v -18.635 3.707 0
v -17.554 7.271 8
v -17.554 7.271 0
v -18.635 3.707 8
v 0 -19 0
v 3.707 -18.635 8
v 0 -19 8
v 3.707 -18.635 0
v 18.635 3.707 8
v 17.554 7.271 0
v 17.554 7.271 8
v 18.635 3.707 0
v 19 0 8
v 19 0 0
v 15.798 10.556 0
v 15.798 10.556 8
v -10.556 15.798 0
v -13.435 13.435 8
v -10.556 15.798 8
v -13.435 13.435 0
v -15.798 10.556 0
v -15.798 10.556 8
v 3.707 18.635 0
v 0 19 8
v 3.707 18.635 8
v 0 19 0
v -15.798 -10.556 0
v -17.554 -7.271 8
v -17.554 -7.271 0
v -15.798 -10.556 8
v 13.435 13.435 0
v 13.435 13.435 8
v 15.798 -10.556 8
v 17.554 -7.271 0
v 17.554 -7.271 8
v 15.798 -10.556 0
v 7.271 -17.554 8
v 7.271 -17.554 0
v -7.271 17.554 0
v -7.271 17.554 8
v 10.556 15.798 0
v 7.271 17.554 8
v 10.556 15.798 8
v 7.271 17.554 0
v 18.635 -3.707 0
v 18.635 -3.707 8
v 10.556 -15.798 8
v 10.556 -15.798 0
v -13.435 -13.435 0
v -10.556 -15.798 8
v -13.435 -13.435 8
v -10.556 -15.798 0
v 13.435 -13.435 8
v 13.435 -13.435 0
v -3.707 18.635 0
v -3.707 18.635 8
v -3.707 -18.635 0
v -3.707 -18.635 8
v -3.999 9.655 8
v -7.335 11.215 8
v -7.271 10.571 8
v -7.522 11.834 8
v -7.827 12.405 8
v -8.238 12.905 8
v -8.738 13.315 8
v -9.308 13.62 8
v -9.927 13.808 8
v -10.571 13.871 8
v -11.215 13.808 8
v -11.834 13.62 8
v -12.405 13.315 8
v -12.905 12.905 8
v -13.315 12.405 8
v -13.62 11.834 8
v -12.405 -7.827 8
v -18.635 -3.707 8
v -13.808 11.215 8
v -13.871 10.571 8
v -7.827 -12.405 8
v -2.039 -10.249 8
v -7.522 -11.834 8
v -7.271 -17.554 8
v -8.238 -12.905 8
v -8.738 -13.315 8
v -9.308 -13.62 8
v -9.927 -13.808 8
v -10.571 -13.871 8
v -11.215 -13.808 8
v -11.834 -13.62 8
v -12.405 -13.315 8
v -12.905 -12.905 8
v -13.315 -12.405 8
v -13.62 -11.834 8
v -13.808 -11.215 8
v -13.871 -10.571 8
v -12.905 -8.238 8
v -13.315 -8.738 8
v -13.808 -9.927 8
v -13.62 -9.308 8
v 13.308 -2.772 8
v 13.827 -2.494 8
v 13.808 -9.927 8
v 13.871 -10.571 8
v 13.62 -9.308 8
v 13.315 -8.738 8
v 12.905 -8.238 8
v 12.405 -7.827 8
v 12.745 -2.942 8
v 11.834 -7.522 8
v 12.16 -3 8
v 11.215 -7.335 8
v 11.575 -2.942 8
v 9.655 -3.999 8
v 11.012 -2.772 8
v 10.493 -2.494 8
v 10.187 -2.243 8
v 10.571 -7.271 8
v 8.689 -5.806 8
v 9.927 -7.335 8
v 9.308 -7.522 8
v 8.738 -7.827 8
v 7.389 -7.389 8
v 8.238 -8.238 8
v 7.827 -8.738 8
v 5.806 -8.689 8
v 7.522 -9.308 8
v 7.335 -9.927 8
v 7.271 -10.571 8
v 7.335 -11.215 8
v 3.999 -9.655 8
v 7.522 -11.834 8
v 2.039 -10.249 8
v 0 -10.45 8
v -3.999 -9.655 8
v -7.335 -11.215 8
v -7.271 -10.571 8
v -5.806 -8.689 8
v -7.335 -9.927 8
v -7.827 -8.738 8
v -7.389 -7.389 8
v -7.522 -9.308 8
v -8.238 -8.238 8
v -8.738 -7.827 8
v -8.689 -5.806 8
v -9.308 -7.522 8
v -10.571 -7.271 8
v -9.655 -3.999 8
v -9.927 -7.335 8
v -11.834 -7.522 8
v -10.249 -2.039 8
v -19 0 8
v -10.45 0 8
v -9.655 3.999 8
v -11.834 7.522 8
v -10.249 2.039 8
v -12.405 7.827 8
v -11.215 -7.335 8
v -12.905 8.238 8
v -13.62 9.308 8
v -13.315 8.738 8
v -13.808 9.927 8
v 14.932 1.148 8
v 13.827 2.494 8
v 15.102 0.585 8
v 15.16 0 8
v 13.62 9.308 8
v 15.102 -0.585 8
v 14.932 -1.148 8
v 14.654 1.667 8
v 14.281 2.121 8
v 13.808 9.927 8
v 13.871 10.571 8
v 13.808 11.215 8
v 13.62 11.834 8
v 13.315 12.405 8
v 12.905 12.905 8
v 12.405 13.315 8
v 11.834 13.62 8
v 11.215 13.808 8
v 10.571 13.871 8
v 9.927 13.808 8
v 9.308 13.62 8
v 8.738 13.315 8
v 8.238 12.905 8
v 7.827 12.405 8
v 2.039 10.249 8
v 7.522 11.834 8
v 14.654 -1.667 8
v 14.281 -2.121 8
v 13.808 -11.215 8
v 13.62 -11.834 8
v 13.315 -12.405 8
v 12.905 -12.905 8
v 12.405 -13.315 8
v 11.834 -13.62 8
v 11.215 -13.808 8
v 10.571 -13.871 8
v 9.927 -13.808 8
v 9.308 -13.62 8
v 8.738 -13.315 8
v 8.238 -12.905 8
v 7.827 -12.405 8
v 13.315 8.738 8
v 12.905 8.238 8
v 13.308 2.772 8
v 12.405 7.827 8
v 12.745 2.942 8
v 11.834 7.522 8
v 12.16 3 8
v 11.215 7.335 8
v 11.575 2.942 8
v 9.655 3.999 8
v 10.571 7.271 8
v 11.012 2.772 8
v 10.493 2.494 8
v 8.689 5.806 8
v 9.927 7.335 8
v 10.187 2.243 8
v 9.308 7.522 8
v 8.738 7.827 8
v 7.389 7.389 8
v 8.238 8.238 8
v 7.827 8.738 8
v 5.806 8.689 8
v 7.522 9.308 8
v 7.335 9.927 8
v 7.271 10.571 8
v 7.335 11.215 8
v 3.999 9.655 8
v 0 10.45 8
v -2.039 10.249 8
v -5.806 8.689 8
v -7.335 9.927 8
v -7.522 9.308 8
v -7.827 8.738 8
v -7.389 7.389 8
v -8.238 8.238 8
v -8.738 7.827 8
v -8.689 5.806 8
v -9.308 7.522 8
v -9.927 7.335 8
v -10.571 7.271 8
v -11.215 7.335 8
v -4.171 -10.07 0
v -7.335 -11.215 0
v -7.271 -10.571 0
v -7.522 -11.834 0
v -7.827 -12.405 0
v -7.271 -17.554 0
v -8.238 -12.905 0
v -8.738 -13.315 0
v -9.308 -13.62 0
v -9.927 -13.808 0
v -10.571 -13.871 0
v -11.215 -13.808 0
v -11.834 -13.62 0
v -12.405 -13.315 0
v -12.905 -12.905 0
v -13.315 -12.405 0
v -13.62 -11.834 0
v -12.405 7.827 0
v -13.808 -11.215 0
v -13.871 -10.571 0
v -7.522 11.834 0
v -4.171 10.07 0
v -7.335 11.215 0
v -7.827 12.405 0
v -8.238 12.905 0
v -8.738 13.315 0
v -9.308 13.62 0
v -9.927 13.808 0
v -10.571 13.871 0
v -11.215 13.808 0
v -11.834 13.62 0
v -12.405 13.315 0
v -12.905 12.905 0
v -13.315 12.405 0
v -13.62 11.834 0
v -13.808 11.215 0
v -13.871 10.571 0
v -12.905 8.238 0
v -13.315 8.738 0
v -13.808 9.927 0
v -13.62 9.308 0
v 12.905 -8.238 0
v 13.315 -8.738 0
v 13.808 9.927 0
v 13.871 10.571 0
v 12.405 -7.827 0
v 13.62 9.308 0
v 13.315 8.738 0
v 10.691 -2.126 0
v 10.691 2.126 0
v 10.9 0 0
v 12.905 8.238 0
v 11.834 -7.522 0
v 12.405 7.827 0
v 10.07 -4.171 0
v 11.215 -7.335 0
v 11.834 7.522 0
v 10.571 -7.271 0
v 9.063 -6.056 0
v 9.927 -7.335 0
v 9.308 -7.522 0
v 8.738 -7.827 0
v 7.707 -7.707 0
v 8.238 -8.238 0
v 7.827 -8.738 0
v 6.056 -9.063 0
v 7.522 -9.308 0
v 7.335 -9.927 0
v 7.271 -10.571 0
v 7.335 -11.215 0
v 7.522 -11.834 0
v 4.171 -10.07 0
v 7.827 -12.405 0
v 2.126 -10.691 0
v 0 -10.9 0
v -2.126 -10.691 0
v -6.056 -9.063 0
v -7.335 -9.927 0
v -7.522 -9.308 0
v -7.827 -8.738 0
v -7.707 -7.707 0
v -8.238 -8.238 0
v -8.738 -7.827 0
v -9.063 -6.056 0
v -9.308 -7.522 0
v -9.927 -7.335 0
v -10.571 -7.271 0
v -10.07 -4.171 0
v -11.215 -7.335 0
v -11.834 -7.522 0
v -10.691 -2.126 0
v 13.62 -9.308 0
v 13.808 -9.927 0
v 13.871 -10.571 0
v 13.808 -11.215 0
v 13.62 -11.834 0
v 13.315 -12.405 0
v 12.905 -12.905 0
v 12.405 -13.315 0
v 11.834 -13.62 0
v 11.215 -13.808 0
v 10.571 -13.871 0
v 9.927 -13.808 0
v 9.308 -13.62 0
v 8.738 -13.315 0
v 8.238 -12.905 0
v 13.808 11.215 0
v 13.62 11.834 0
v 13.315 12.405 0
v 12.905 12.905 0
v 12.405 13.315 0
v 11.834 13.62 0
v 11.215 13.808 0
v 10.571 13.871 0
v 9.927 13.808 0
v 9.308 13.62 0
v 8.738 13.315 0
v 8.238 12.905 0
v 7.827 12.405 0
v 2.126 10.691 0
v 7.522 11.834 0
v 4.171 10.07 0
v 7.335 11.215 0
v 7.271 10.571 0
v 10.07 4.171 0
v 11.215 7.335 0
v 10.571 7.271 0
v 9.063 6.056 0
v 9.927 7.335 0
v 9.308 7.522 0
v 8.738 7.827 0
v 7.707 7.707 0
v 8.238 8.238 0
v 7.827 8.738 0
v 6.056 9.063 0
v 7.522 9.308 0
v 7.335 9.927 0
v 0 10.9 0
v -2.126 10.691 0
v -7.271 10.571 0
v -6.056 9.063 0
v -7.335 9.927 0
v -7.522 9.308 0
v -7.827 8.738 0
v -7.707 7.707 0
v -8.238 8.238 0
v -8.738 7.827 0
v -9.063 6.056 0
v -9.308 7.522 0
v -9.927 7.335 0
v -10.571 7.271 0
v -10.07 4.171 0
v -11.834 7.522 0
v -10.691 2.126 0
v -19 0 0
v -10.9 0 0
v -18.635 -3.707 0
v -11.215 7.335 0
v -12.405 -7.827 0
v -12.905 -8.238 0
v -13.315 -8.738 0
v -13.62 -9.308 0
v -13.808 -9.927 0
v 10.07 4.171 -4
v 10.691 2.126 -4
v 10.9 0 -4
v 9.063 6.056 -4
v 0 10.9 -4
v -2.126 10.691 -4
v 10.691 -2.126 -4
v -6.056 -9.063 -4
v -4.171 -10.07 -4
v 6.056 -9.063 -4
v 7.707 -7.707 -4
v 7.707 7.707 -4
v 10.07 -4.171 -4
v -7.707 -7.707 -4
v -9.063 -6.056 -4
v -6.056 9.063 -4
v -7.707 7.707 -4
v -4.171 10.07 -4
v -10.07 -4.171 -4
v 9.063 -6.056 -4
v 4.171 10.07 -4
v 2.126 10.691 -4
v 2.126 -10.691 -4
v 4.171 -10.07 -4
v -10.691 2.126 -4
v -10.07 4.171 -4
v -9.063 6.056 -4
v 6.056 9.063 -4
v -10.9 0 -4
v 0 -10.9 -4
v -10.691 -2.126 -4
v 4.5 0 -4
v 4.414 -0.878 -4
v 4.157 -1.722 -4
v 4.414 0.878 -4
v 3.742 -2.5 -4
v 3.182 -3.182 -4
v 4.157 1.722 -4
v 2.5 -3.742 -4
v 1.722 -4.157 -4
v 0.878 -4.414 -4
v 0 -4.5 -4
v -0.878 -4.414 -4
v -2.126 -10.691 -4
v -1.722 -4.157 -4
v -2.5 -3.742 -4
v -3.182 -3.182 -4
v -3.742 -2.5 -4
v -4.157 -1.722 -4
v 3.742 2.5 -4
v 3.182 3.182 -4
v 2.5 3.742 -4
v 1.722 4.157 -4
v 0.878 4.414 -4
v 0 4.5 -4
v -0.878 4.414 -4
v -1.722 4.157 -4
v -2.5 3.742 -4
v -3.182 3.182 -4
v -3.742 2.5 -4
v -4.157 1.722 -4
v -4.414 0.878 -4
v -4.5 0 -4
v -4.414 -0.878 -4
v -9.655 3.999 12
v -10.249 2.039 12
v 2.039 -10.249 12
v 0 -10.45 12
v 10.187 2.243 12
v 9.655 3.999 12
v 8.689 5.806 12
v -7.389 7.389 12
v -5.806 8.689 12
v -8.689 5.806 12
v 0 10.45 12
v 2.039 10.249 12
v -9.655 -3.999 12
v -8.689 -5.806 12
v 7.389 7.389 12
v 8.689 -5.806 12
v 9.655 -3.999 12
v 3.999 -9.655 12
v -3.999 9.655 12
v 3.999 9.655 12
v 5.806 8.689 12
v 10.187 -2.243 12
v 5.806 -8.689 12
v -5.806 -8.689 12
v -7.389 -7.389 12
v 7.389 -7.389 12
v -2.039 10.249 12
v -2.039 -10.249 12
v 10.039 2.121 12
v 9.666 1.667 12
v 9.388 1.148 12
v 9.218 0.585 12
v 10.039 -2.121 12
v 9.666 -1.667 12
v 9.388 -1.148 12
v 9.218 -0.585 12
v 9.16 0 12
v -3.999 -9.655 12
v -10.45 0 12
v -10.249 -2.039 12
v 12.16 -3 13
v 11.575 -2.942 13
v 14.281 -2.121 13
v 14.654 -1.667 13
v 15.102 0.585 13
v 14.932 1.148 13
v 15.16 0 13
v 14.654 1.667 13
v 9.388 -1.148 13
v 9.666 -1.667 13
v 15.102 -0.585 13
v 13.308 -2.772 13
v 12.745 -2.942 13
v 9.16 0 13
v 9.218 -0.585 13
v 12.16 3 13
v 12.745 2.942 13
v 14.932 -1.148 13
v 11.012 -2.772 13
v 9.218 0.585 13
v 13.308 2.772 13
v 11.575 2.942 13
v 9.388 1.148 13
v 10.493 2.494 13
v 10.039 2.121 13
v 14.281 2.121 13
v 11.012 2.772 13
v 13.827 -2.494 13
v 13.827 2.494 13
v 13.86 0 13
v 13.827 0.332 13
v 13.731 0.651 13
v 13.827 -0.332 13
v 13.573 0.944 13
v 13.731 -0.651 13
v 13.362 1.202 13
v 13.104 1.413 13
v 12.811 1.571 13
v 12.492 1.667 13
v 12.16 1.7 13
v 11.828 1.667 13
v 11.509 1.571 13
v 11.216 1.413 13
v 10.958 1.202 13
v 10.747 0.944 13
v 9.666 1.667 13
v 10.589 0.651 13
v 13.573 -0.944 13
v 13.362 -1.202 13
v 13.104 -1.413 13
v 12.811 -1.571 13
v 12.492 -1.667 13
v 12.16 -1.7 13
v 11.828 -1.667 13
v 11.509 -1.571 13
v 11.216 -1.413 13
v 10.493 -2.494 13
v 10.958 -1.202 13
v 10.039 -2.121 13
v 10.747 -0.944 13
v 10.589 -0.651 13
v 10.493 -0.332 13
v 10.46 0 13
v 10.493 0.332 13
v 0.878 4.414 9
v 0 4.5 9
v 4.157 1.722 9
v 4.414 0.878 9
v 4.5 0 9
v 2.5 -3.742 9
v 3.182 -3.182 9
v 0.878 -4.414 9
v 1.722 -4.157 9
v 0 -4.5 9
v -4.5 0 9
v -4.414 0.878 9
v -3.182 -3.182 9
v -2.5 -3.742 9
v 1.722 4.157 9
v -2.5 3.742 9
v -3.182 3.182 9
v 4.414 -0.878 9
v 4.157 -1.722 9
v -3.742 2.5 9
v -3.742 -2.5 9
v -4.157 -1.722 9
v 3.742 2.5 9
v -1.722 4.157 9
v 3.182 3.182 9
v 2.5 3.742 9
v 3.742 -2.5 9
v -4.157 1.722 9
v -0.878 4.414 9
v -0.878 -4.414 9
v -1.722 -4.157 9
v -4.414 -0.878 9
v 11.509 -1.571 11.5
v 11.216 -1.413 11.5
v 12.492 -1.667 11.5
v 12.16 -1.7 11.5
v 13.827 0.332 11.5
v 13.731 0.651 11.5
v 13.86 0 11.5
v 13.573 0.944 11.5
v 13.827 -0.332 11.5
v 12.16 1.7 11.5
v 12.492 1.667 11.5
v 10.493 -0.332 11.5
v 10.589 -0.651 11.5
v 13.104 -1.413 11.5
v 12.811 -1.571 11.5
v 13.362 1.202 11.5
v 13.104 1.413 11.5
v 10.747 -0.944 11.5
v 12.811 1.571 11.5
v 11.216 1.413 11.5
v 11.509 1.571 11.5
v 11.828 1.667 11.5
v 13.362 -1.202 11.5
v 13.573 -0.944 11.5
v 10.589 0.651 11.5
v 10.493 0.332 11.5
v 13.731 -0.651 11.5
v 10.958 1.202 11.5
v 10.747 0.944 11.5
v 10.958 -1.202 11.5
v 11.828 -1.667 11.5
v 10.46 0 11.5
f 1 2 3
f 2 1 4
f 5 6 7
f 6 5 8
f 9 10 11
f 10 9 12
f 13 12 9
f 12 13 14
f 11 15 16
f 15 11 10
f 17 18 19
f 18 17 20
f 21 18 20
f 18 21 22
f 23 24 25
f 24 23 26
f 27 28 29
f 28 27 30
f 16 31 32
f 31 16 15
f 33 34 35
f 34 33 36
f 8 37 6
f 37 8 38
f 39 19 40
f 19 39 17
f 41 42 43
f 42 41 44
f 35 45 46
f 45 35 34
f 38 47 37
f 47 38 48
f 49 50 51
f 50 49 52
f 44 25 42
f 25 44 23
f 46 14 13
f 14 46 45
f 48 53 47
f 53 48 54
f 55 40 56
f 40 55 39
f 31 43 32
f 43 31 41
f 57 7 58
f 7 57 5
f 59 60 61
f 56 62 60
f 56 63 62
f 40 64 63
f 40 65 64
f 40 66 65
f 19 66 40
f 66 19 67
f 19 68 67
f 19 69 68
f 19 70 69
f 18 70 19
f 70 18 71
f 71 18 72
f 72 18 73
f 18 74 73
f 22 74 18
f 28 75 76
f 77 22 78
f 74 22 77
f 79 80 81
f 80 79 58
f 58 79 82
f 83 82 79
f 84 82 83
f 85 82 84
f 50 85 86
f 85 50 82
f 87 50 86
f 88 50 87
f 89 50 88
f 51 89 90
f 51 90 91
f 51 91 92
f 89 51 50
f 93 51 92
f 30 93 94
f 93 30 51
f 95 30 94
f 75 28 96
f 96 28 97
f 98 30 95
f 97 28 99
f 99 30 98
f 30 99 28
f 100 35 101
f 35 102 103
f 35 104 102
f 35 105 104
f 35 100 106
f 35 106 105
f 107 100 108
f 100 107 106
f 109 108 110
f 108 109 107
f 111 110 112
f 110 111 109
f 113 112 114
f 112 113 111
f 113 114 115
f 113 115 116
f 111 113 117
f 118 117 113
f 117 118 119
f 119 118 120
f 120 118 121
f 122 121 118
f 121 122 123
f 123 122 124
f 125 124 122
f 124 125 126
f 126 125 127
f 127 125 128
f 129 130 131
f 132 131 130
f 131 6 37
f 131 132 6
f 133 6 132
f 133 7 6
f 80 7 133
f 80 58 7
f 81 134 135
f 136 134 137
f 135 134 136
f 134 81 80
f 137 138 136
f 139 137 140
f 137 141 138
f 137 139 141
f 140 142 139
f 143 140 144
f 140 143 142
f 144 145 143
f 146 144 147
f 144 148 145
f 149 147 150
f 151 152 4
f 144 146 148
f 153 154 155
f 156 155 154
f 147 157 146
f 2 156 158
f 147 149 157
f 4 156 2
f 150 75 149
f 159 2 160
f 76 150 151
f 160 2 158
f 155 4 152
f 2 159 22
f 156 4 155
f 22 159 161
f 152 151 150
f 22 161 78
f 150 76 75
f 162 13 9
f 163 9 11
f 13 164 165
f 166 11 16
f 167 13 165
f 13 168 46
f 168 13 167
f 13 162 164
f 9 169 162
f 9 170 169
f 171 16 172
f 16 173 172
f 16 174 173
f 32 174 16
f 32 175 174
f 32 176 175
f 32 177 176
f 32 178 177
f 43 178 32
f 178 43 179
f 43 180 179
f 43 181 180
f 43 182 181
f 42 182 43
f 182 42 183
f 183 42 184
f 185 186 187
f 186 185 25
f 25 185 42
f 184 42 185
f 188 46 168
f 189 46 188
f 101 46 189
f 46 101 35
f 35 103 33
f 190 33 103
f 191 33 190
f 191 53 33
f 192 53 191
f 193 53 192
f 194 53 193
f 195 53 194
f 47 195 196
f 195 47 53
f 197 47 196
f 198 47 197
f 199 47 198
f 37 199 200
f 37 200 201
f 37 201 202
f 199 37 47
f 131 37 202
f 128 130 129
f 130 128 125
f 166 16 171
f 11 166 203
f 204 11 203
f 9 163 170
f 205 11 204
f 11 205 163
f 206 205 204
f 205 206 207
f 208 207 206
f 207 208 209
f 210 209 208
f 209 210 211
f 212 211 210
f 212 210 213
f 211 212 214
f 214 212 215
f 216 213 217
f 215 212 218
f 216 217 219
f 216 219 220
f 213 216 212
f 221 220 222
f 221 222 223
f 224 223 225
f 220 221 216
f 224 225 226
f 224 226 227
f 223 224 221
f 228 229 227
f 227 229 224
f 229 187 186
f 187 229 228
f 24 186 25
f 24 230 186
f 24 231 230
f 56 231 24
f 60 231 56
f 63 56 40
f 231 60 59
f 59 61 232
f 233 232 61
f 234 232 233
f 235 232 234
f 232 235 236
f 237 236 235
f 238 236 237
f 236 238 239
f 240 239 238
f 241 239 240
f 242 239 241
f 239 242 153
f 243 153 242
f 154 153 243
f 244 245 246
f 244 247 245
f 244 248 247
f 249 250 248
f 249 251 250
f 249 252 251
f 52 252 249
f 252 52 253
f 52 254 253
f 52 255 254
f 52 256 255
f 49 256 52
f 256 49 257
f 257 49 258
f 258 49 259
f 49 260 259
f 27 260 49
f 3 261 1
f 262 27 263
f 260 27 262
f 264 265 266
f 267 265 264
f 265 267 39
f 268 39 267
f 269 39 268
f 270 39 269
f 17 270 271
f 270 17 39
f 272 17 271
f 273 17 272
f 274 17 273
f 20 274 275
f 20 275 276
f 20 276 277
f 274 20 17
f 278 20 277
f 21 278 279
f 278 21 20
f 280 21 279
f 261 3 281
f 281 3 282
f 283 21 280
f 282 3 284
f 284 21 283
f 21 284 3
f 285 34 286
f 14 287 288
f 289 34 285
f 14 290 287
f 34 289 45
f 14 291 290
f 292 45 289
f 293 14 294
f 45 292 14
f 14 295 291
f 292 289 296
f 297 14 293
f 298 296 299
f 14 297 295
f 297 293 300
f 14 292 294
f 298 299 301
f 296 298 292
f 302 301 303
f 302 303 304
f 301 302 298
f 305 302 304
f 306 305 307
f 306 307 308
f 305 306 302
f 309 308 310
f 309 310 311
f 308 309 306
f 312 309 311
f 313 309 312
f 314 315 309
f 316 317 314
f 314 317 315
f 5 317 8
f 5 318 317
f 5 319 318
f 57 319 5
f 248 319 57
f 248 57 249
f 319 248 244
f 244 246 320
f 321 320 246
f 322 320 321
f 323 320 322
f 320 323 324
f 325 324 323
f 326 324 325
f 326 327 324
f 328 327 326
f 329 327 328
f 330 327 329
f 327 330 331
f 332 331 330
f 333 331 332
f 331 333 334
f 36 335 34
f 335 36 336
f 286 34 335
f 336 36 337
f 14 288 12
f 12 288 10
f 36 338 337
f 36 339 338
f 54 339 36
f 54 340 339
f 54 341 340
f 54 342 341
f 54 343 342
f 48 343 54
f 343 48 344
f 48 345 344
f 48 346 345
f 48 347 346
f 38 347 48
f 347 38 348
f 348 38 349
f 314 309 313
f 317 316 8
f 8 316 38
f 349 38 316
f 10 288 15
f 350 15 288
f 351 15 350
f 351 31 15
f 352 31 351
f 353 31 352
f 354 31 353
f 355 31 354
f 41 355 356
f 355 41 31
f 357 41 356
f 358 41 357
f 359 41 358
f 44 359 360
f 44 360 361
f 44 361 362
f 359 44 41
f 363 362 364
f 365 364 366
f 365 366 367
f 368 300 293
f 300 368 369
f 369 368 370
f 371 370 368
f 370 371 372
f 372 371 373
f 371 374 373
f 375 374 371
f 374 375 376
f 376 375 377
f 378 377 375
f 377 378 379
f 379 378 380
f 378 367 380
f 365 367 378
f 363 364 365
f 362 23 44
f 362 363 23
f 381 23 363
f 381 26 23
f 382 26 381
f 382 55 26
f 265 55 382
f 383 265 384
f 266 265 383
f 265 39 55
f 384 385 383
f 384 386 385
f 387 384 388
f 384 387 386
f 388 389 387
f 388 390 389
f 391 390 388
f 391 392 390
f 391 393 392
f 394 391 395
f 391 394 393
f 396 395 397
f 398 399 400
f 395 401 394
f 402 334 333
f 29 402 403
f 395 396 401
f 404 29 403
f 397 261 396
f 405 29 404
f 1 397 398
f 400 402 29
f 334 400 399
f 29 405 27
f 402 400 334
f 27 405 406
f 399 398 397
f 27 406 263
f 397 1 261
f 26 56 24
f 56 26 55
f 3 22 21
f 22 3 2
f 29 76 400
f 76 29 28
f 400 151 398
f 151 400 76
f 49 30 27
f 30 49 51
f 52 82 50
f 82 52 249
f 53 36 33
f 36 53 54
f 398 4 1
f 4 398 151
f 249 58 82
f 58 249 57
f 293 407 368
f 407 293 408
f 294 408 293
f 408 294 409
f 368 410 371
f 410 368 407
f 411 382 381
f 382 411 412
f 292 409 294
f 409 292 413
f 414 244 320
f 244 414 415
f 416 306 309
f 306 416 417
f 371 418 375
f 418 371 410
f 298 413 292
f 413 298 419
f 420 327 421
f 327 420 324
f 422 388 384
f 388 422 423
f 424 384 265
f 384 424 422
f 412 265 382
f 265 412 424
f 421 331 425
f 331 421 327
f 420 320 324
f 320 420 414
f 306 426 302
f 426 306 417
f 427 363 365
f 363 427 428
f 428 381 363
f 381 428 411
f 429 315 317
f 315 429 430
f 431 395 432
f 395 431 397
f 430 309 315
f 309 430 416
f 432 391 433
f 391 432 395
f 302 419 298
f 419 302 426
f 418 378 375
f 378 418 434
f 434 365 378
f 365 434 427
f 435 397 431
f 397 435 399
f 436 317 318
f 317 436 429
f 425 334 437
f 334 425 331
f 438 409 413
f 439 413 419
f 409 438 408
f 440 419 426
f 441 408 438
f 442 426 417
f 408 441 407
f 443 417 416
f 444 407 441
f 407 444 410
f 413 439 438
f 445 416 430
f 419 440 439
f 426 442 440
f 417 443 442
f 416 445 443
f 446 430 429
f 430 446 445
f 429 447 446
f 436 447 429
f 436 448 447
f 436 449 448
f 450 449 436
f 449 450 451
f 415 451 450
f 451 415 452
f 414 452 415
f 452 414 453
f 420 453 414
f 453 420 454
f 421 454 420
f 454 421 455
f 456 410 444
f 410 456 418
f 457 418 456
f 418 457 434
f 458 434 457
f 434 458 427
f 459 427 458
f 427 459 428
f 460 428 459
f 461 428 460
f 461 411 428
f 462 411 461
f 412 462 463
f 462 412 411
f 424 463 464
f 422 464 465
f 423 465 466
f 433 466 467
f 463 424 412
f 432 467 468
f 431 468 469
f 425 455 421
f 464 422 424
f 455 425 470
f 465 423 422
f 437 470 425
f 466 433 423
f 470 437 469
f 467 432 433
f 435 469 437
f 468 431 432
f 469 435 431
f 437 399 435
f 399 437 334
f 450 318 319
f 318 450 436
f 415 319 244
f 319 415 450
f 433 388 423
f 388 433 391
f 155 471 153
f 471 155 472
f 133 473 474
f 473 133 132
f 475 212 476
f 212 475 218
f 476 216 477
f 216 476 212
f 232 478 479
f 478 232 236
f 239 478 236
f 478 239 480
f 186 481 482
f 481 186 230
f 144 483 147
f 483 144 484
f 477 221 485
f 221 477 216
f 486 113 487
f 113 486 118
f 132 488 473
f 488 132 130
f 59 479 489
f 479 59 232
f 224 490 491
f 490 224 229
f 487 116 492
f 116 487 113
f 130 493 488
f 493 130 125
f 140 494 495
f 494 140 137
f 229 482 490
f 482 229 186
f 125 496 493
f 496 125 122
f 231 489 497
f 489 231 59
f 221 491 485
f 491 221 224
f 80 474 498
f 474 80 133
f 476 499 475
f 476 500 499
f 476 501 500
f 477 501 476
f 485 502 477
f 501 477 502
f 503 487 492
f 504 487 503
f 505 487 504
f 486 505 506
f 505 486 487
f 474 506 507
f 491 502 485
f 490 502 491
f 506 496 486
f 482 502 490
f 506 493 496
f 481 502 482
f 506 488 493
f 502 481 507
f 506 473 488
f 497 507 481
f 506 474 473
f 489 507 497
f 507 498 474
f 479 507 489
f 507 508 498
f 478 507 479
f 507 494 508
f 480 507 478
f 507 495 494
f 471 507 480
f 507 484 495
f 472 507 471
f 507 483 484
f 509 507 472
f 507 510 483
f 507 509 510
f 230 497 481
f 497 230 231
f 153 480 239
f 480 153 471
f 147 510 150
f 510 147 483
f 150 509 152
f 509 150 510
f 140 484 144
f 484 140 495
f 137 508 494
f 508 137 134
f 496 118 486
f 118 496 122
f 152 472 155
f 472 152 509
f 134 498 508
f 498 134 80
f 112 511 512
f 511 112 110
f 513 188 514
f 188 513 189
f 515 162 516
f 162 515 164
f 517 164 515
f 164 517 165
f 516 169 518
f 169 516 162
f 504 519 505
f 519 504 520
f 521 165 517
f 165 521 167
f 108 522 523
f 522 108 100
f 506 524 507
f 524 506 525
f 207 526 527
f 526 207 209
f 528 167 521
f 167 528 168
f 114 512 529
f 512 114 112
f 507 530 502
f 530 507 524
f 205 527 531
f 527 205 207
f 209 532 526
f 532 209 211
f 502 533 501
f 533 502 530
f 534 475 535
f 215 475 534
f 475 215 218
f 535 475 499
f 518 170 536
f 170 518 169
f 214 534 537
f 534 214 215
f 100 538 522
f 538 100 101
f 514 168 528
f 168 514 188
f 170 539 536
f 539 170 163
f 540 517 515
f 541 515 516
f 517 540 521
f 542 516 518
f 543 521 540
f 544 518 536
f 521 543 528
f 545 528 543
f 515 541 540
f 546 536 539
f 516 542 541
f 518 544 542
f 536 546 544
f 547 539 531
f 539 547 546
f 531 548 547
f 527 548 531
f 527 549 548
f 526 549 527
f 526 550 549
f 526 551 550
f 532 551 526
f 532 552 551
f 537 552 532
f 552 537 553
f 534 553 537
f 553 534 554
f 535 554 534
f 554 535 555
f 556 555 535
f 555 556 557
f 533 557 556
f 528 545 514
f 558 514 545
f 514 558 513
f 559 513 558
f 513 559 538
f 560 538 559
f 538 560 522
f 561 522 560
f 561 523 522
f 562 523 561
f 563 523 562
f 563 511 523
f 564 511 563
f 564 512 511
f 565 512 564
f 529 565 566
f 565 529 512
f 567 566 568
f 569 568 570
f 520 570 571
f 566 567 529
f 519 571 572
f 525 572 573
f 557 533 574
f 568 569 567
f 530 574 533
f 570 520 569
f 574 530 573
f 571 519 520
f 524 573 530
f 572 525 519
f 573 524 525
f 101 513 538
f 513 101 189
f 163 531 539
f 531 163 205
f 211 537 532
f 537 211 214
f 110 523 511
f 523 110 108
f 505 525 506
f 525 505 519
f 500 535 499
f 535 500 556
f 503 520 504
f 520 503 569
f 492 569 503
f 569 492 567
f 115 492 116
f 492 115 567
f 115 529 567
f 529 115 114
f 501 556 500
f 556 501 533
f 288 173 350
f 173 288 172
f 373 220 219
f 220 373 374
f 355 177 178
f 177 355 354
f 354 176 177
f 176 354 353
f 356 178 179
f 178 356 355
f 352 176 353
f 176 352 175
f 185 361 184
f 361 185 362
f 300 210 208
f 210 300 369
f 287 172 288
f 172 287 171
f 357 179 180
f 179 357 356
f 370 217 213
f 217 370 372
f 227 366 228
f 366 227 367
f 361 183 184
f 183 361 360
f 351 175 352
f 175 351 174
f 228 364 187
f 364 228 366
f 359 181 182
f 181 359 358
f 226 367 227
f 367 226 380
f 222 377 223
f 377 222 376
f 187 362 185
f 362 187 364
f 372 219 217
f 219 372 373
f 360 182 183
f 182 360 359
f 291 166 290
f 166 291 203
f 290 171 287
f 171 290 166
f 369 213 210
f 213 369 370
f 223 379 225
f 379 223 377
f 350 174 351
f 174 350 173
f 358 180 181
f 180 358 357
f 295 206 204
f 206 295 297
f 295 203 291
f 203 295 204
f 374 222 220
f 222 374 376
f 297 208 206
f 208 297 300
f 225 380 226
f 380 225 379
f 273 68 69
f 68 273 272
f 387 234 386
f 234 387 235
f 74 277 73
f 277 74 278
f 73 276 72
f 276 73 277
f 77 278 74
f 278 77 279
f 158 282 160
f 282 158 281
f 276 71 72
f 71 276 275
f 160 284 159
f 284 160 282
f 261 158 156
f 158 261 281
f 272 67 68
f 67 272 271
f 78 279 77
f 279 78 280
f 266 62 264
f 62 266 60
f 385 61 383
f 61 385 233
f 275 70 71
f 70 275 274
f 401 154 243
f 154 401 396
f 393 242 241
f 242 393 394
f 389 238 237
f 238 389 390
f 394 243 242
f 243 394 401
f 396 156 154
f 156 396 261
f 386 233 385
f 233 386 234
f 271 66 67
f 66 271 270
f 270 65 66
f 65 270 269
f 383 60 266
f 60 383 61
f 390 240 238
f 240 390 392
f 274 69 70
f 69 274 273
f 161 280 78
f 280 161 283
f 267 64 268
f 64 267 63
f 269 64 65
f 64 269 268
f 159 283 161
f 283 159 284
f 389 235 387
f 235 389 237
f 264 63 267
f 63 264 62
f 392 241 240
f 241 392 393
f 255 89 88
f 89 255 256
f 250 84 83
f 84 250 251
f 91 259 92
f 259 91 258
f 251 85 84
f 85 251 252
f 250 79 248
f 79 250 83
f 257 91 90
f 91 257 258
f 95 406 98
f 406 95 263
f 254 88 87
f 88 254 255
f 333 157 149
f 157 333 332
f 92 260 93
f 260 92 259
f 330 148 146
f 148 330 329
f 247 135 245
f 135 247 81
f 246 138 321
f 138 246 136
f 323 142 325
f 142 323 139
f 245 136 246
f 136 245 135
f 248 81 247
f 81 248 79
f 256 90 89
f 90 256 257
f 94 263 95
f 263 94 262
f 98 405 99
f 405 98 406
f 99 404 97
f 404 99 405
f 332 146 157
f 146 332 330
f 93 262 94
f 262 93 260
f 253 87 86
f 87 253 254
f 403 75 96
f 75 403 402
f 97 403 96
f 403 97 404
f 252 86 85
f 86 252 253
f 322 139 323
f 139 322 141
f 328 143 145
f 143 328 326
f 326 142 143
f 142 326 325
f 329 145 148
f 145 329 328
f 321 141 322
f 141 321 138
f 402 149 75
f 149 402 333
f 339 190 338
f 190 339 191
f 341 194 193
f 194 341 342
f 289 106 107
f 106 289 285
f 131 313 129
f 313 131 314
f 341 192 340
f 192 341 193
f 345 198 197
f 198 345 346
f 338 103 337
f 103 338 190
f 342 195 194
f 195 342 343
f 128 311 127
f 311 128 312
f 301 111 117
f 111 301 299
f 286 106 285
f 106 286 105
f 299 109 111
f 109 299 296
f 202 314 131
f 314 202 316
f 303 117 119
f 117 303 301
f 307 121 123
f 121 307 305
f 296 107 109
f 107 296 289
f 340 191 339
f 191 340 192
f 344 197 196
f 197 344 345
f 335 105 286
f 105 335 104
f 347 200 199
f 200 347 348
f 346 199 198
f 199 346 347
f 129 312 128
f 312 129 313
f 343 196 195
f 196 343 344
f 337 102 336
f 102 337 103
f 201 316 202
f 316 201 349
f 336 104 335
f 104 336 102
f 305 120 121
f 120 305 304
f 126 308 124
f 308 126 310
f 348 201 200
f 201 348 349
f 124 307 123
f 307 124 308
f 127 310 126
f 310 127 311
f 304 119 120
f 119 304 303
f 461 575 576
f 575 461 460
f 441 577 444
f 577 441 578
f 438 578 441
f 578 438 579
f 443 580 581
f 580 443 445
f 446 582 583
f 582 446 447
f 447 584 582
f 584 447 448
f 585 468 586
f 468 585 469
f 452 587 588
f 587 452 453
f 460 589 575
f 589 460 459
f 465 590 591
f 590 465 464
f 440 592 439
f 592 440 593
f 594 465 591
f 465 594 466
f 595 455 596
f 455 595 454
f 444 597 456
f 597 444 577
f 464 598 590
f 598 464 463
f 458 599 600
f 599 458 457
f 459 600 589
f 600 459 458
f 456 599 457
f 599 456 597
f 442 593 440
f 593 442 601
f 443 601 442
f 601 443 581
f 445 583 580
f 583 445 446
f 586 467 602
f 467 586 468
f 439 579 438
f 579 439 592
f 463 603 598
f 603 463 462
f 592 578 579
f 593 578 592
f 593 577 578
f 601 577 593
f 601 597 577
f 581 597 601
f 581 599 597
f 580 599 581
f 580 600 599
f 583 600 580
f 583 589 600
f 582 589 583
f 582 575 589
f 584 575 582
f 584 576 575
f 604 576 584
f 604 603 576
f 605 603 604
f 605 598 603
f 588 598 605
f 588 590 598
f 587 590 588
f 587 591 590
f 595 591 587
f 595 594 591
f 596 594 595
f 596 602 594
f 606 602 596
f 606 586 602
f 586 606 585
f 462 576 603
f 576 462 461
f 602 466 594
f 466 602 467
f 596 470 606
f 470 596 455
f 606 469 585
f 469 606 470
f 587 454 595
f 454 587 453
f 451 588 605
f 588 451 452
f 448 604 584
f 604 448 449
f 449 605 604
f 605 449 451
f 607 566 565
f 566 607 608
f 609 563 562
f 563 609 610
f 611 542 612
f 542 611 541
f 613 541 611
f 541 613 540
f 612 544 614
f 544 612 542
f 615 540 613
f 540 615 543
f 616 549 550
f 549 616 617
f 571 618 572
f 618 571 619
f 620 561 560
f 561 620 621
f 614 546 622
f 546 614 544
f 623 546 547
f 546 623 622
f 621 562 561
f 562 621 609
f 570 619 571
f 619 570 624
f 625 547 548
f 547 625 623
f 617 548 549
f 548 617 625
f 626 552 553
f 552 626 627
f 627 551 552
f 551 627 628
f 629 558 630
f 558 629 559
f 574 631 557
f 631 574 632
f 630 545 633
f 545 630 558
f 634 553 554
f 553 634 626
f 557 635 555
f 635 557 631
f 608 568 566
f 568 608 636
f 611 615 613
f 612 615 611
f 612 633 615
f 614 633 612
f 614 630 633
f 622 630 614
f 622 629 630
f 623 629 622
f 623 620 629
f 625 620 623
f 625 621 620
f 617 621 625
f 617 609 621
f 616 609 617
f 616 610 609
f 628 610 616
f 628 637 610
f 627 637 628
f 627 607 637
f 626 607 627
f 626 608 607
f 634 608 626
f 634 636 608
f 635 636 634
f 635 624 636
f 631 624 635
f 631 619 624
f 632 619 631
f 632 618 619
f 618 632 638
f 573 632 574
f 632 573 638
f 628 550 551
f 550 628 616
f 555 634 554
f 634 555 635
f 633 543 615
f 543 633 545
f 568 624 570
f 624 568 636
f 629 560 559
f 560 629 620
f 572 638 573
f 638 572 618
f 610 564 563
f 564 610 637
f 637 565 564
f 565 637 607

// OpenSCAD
$fn = 32;

// ----------------------------------------------------------------------
// Retaining cap: 608 cover, 38 mm, spigot 21.8 mm
// ----------------------------------------------------------------------

// --- parameters (mm) ---
cover_d = 38;             // cover diameter
cover_t = 8;              // cover thickness
spigot_d = 21.8;          // spigot that enters the housing
spigot_h = 4;             // spigot height
shaft_d = 9;              // shaft opening
bolt_d = 6.6;             // bolt clearance
bolt_r = 14.95;           // bolt circle radius
dome_h = 4;               // raised centre
nipple_d = 6;             // grease nipple boss
nipple_h = 5;             // grease nipple boss height

module cover() {
  cylinder(h = cover_t, d = cover_d);
}

module spigot() {
  /* sunk 1 mm into the cover; the spigot sets the overall height */
  translate([0, 0, -spigot_h]) cylinder(h = spigot_h + 1, d = spigot_d);
}

module dome() {
  translate([0, 0, cover_t - 1]) cylinder(h = dome_h + 1, d = cover_d * 0.55);
}

module nipple() {
  translate([cover_d * 0.32, 0, cover_t - 1])
    cylinder(h = nipple_h + 1, d = nipple_d);
}

difference() {
  union() {
    cover();
    spigot();
    dome();
    nipple();
  }
  for (i = [0 : 3]) rotate([0, 0, 45 + i * 90]) translate([bolt_r, 0, -spigot_h - 1])
    cylinder(h = spigot_h + cover_t + 2, d = bolt_d);
  translate([0, 0, -spigot_h - 1]) cylinder(h = spigot_h + cover_t + 2, d = shaft_d);
  translate([cover_d * 0.32, 0, cover_t + nipple_h - 1.5]) cylinder(h = 4, d = 3.4);
}
